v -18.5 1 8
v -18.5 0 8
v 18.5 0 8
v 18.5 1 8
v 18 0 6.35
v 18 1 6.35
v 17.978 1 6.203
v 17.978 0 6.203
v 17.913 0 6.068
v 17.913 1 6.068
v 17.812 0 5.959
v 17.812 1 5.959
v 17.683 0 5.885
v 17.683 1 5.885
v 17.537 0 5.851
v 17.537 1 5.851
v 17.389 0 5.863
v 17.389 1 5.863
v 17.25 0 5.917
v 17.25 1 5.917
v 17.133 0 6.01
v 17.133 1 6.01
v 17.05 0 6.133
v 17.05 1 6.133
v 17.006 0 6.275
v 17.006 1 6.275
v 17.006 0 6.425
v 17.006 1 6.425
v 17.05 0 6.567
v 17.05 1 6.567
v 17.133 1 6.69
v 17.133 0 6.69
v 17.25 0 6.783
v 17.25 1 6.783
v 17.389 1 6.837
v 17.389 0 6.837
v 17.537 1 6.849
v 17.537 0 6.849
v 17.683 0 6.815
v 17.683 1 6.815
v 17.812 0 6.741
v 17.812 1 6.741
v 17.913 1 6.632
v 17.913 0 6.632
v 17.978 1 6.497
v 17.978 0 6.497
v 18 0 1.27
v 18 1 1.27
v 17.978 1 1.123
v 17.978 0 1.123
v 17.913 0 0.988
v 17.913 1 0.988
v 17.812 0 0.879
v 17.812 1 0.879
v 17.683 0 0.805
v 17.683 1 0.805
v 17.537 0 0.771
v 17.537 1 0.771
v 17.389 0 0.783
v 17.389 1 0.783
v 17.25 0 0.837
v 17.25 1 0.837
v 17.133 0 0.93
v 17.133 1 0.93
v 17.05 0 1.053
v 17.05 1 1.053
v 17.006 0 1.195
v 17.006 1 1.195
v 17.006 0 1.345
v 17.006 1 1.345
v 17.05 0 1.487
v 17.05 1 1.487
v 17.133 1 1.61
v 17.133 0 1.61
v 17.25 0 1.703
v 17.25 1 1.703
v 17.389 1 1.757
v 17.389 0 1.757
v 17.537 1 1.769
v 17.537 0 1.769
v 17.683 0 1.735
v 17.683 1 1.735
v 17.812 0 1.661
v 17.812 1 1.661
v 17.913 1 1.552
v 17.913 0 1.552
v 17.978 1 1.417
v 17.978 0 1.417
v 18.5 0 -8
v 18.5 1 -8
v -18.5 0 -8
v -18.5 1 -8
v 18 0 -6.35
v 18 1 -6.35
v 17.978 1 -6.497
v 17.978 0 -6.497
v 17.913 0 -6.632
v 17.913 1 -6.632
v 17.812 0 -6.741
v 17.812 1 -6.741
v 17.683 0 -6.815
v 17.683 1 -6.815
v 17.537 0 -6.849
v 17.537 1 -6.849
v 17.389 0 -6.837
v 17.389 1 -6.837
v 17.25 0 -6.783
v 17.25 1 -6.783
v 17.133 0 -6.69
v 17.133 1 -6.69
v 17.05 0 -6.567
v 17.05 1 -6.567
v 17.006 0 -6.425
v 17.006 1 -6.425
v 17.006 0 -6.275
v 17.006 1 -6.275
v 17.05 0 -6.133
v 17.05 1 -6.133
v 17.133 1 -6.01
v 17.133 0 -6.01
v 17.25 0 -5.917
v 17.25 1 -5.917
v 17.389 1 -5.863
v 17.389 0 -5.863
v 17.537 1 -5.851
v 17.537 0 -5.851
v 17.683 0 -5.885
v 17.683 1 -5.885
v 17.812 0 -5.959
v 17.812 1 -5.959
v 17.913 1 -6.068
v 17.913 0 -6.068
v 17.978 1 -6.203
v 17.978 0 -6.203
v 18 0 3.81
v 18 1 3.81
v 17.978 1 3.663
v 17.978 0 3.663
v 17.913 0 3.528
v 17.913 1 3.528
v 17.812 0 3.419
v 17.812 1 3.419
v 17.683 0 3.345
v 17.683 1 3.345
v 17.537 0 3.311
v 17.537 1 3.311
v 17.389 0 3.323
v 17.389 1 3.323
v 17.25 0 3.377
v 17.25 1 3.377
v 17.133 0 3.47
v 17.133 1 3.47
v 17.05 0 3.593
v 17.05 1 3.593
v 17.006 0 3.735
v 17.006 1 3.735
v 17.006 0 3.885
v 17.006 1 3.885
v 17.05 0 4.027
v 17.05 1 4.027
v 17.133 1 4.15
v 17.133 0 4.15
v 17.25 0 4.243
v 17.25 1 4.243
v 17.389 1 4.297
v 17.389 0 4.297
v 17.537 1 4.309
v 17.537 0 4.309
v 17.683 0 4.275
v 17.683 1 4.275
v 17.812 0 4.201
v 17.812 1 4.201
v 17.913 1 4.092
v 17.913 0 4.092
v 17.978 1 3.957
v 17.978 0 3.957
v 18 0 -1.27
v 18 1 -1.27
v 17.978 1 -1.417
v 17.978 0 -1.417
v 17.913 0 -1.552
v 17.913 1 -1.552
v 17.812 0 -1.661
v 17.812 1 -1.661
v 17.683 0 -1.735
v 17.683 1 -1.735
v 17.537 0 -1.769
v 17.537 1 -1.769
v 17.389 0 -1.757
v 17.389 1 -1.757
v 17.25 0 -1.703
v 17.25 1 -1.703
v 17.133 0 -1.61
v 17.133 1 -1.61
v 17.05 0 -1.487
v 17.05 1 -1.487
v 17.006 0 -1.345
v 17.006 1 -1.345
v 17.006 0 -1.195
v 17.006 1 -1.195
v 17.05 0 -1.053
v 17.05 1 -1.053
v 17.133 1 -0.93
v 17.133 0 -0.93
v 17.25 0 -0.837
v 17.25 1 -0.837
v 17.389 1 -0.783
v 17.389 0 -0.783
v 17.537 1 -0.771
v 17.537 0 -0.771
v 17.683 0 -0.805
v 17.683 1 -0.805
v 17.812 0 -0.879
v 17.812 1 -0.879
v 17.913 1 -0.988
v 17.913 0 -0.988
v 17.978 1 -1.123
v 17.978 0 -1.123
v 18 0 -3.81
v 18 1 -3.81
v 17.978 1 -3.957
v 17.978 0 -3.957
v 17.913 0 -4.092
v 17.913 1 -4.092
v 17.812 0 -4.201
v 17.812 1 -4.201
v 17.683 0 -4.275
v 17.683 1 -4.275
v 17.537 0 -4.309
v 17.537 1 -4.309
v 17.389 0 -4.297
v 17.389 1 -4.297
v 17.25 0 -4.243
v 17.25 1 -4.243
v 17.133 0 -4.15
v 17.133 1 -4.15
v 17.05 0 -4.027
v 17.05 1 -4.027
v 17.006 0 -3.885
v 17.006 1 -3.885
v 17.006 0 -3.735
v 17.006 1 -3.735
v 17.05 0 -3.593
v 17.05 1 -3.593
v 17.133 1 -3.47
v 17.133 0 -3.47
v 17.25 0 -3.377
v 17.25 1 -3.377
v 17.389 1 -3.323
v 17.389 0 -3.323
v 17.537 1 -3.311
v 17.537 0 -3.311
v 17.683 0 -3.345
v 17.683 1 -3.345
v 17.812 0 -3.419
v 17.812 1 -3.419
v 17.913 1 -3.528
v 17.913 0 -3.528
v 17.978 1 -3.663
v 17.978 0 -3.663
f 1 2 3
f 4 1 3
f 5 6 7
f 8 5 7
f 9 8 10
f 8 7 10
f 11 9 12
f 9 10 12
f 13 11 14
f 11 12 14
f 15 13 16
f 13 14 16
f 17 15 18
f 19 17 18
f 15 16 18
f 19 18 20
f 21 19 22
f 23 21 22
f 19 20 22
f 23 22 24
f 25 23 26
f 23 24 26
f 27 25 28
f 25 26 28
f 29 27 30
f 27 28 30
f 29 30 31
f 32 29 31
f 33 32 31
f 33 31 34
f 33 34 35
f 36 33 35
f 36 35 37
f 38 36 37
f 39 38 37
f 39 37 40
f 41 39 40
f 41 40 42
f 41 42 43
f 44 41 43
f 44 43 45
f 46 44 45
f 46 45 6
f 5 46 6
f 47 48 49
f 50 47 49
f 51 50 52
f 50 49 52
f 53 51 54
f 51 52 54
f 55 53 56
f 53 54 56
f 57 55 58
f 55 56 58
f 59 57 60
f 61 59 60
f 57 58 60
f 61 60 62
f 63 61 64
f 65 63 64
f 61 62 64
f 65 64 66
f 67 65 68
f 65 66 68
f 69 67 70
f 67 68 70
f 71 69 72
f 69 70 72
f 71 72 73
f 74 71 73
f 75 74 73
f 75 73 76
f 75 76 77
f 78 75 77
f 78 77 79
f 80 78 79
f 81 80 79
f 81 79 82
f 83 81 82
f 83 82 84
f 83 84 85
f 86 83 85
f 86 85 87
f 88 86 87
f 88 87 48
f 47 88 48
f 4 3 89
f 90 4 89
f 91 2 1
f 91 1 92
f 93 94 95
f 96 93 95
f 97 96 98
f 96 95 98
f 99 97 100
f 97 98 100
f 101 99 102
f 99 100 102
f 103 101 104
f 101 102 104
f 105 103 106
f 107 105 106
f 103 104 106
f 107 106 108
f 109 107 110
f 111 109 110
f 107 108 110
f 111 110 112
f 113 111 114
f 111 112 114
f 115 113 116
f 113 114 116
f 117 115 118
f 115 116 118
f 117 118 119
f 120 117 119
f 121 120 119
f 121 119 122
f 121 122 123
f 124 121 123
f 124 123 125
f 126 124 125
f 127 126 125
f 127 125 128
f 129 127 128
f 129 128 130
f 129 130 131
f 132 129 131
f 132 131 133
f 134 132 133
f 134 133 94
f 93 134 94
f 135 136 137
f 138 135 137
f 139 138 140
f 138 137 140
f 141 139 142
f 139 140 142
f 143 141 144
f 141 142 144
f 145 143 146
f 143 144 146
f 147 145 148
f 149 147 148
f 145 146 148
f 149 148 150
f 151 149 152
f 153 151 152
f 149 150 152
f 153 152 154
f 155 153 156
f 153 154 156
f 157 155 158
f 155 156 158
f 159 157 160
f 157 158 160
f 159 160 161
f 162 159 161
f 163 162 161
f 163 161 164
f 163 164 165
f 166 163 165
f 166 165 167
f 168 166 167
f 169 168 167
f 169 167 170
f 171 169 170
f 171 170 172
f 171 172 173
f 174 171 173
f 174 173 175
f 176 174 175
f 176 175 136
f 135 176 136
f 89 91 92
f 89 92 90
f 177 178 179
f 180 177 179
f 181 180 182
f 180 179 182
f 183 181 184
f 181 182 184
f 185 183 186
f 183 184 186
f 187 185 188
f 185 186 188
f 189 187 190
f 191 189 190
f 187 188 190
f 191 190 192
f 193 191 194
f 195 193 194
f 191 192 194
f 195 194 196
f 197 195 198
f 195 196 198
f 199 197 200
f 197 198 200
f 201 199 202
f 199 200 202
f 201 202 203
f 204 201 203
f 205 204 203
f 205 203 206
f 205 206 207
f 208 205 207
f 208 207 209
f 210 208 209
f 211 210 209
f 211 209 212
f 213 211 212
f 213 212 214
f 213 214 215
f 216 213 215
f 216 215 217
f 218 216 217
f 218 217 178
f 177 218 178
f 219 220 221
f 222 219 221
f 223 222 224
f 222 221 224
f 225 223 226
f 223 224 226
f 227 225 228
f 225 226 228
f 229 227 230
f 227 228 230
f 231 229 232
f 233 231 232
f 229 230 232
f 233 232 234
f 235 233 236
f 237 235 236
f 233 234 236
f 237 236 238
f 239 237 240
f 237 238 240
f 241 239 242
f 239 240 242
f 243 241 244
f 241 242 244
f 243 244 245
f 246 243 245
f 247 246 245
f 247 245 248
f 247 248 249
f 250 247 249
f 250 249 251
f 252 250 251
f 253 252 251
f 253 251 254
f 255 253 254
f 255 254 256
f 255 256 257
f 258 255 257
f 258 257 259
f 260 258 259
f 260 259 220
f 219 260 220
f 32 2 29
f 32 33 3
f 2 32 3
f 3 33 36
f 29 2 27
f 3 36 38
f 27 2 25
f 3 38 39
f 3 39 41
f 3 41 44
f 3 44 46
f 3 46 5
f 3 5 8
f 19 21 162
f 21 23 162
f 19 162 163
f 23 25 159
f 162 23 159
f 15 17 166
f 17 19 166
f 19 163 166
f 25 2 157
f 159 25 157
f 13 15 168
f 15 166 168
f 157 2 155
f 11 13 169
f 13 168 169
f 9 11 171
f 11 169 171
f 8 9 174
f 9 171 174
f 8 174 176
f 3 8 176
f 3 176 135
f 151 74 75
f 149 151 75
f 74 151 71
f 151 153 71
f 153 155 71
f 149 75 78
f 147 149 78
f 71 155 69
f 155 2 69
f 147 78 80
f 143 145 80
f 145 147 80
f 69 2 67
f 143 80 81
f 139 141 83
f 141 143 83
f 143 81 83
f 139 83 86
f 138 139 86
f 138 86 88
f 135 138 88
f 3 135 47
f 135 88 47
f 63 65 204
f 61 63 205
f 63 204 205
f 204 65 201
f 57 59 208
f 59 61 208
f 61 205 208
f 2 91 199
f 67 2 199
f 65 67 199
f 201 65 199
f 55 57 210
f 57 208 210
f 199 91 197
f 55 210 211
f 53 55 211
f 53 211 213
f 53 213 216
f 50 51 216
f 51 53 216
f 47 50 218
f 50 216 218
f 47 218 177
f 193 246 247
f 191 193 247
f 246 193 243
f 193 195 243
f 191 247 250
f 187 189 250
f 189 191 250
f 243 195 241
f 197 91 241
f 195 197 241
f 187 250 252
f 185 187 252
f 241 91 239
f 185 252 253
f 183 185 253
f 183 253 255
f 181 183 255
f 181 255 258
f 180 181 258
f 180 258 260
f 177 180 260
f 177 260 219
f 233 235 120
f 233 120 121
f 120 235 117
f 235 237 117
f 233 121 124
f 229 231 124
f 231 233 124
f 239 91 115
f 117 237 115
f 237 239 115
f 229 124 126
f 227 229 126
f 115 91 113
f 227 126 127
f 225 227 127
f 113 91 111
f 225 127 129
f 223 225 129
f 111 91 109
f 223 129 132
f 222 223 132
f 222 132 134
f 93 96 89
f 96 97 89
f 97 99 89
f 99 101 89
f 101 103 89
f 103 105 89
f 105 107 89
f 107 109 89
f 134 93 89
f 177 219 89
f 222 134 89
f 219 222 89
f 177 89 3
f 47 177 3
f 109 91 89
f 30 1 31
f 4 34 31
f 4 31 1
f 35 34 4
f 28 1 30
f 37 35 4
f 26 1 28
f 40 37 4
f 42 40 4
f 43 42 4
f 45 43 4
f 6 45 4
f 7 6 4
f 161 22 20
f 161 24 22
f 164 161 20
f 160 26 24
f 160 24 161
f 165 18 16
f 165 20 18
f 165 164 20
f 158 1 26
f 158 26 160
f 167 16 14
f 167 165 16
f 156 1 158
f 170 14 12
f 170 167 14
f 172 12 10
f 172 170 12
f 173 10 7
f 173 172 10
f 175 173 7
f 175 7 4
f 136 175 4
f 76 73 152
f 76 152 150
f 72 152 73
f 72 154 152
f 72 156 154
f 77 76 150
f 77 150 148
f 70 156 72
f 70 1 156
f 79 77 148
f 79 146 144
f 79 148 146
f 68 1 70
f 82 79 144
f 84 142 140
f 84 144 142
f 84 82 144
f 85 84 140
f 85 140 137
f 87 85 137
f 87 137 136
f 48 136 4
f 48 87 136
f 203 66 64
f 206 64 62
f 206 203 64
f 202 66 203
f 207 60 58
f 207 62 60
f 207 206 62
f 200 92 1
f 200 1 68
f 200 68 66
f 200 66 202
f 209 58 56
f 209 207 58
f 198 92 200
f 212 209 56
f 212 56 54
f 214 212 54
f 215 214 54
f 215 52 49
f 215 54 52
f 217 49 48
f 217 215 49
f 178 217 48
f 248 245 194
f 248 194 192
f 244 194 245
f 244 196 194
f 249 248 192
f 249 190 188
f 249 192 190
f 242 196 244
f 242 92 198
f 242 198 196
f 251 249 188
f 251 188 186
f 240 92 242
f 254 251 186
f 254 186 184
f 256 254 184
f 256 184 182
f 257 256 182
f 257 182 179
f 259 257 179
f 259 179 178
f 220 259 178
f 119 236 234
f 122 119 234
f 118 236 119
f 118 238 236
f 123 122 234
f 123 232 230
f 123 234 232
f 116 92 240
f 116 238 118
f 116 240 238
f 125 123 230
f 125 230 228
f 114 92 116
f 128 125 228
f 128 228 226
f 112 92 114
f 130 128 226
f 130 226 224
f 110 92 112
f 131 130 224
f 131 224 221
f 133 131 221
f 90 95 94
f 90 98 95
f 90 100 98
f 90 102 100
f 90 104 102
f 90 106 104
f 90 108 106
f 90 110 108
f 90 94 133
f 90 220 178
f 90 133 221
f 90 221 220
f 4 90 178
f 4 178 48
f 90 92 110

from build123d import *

# Parameters (mm, degrees)
SKETCH1_W           = 37
SKETCH1_H           = 16
BOSS_EXTRUDE1_DEPTH = 1
SKETCH2_R           = 0.5
CUT_EXTRUDE1_DEPTH  = 10


with BuildPart() as part:
    # Sketch1 → Boss-Extrude1 (new body)
    with BuildSketch(Plane(origin=(0, 0, 0), x_dir=(1, 0, 0), z_dir=(0, 1, 0))):
        Rectangle(SKETCH1_W, SKETCH1_H)
    extrude(amount=BOSS_EXTRUDE1_DEPTH)

    # Sketch2 → Cut-Extrude1 (cut)
    with BuildSketch(Plane(origin=(0, 1, 0), x_dir=(1, 0, 0), z_dir=(0, 1, 0))):
        with Locations((17.5, -6.35)):
            Circle(SKETCH2_R)
        with Locations((17.5, -3.81)):
            Circle(SKETCH2_R)
        with Locations((17.5, -1.27)):
            Circle(SKETCH2_R)
        with Locations((17.5, 1.27)):
            Circle(SKETCH2_R)
        with Locations((17.5, 3.81)):
            Circle(SKETCH2_R)
        with Locations((17.5, 6.35)):
            Circle(SKETCH2_R)
    extrude(amount=-CUT_EXTRUDE1_DEPTH, mode=Mode.SUBTRACT)


solid = part.part
